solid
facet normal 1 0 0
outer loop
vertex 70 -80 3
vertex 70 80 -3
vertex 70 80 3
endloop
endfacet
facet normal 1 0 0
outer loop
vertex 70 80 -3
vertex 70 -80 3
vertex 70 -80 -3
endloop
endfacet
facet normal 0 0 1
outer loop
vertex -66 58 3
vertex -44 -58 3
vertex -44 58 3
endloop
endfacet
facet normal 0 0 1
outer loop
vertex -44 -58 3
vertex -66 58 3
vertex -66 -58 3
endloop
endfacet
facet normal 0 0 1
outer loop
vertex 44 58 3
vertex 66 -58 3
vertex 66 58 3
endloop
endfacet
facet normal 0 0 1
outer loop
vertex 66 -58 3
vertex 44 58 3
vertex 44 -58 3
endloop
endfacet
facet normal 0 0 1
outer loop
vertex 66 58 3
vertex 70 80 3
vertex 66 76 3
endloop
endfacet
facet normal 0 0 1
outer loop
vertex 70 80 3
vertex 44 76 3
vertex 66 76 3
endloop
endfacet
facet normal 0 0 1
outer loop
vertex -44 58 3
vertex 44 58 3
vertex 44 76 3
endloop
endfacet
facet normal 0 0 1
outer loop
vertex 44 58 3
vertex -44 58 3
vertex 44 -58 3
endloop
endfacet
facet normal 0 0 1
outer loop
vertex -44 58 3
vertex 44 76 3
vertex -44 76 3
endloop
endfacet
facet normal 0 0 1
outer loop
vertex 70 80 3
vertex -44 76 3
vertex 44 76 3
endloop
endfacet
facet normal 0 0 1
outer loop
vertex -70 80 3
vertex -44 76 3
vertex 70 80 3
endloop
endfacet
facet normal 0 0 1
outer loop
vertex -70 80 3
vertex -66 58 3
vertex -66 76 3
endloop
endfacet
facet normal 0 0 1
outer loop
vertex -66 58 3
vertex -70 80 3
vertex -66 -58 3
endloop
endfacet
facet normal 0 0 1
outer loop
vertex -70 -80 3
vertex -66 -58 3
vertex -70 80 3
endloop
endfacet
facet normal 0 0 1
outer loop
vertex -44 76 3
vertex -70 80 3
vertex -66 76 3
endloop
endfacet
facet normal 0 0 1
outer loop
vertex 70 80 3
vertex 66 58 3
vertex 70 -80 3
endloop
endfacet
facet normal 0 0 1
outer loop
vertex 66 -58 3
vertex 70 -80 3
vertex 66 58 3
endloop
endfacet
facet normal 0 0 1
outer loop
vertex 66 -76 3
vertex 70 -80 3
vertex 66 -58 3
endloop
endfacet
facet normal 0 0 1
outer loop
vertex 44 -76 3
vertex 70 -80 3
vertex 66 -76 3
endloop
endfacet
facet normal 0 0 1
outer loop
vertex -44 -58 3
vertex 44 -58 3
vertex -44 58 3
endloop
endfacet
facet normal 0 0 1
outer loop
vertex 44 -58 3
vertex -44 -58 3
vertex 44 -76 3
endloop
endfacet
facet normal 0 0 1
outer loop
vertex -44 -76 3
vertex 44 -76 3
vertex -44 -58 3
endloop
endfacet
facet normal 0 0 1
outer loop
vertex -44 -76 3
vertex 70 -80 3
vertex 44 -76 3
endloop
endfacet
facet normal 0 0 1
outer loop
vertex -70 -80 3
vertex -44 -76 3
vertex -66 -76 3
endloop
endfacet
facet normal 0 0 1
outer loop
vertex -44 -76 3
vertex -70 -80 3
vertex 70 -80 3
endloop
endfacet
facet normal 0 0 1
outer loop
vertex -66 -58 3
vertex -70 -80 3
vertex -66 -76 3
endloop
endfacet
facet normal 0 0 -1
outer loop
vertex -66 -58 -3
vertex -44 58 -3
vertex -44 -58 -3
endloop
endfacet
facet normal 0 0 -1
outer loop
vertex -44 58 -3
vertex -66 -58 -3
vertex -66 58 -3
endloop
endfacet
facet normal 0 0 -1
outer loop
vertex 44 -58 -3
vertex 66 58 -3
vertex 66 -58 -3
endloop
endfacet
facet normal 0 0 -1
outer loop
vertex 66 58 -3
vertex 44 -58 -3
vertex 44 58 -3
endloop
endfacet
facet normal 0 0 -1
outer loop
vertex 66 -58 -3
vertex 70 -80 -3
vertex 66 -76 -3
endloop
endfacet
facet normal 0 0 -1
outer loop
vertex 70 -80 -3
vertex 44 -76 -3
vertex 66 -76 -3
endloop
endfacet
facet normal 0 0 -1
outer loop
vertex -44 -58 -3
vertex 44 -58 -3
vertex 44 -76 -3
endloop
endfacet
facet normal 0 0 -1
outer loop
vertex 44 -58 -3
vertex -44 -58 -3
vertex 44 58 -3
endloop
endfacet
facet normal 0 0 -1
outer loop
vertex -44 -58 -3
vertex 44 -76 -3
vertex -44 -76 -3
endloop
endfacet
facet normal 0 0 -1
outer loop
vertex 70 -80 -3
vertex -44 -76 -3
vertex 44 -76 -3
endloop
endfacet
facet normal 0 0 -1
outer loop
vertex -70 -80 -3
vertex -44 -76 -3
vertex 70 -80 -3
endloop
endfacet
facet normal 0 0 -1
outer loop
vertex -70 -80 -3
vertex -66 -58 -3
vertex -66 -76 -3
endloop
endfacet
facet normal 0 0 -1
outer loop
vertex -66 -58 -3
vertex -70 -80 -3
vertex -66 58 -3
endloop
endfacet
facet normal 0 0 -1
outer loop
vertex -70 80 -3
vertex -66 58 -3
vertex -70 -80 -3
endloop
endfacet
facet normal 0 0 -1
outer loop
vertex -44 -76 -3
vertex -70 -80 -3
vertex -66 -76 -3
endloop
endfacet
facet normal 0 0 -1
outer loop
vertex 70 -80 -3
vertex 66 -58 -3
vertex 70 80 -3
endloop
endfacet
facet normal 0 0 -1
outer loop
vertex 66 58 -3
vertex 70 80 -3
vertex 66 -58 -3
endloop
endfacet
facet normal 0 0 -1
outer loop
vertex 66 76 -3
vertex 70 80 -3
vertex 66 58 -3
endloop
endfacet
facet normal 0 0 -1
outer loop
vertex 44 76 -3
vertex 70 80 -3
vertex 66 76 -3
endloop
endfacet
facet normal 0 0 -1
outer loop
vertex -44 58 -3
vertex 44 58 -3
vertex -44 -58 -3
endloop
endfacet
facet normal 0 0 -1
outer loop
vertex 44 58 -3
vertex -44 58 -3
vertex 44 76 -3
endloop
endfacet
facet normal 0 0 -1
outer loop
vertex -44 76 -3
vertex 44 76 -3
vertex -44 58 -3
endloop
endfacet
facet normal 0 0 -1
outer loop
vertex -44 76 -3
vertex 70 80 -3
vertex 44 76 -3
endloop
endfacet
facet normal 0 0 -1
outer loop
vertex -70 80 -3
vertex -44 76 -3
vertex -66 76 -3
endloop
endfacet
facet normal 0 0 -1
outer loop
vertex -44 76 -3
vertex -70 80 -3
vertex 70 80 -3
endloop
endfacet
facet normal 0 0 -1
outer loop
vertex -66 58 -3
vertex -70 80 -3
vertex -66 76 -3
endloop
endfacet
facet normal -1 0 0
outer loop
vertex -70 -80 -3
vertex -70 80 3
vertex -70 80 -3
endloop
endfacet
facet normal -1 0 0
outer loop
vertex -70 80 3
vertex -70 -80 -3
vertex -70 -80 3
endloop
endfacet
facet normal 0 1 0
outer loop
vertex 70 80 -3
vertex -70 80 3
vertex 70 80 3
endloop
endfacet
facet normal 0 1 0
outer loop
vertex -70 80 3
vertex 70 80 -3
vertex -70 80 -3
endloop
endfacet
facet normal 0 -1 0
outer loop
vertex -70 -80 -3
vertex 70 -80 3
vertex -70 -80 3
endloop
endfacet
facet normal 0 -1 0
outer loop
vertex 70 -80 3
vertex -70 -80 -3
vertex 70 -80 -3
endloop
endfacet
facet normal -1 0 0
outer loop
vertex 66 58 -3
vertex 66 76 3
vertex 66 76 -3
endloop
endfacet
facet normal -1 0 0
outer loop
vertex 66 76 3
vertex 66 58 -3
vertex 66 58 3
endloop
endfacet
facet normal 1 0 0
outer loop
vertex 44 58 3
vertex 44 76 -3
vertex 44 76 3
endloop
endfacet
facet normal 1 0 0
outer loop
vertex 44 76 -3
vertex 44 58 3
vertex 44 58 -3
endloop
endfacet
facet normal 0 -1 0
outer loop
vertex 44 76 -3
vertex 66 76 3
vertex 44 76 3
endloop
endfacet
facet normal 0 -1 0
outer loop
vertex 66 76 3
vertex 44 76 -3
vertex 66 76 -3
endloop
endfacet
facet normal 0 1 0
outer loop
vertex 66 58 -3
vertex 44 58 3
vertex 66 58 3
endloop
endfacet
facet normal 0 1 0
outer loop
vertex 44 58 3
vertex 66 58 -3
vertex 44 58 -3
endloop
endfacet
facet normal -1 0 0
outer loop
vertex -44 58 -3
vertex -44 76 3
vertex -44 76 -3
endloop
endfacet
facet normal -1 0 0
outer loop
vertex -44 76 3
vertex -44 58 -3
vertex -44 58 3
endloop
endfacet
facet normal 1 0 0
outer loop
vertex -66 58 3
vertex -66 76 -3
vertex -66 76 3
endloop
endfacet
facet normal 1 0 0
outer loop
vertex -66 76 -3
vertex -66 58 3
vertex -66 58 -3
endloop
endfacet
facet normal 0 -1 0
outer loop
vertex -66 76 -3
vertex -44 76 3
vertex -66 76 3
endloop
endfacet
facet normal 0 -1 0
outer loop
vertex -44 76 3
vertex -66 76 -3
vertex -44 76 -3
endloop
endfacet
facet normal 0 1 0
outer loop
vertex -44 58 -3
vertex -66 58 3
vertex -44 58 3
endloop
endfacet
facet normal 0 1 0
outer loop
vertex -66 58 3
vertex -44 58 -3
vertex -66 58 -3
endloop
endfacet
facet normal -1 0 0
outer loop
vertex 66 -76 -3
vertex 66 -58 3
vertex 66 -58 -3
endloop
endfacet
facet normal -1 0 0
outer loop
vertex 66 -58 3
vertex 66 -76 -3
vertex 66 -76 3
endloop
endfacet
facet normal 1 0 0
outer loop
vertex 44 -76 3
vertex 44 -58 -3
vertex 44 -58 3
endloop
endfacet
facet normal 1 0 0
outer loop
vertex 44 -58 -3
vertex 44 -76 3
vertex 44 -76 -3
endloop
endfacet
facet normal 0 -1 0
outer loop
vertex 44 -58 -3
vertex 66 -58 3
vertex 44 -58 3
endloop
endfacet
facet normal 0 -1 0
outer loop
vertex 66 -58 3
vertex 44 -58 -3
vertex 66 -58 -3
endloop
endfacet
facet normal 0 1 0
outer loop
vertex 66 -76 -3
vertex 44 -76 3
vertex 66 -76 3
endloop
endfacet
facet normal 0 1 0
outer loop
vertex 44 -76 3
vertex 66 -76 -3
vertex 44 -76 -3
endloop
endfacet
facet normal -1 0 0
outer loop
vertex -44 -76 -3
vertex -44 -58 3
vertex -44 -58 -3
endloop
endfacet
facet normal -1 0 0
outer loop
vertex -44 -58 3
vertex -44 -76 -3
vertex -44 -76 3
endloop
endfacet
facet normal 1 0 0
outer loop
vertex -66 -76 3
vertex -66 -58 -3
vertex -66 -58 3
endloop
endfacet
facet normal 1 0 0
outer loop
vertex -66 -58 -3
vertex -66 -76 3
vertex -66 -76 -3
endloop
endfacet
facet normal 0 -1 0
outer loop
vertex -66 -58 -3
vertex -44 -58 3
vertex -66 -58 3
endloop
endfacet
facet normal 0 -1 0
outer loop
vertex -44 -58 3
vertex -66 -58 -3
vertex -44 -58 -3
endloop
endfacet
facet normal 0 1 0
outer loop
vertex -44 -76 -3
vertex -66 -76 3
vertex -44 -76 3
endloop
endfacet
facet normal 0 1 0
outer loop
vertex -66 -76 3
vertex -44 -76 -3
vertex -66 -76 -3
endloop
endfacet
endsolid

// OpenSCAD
OverAllLenght=140;//80 +22+22 +4+4 152 + space
OverAllWidth=160;//100 +22+22 +4+4 152 + space
BaseHight=6;
Base=[OverAllLenght,OverAllWidth,BaseHight];
MotorHouseing=[22,18,65];
wheelDistance=4;

   difference(){
cube(Base, center=true);
translate( [Base[0]/2-MotorHouseing[0]/2-wheelDistance,
            Base[1]/2-MotorHouseing[1]/2-wheelDistance, 0]) {
   cube(MotorHouseing, center=true); 
}

translate( [-1*(Base[0]/2-MotorHouseing[0]/2-wheelDistance),
               (Base[1]/2-MotorHouseing[1]/2-wheelDistance), 0]) {
   cube(MotorHouseing, center=true); 
}
translate( [   (Base[0]/2-MotorHouseing[0]/2-wheelDistance),
            -1*(Base[1]/2-MotorHouseing[1]/2-wheelDistance), 0]) {
   cube(MotorHouseing, center=true); 
}
translate( [-1*(Base[0]/2-MotorHouseing[0]/2-wheelDistance),
            -1*(Base[1]/2-MotorHouseing[1]/2-wheelDistance), 0]) {
   cube(MotorHouseing, center=true); 
}

   }
